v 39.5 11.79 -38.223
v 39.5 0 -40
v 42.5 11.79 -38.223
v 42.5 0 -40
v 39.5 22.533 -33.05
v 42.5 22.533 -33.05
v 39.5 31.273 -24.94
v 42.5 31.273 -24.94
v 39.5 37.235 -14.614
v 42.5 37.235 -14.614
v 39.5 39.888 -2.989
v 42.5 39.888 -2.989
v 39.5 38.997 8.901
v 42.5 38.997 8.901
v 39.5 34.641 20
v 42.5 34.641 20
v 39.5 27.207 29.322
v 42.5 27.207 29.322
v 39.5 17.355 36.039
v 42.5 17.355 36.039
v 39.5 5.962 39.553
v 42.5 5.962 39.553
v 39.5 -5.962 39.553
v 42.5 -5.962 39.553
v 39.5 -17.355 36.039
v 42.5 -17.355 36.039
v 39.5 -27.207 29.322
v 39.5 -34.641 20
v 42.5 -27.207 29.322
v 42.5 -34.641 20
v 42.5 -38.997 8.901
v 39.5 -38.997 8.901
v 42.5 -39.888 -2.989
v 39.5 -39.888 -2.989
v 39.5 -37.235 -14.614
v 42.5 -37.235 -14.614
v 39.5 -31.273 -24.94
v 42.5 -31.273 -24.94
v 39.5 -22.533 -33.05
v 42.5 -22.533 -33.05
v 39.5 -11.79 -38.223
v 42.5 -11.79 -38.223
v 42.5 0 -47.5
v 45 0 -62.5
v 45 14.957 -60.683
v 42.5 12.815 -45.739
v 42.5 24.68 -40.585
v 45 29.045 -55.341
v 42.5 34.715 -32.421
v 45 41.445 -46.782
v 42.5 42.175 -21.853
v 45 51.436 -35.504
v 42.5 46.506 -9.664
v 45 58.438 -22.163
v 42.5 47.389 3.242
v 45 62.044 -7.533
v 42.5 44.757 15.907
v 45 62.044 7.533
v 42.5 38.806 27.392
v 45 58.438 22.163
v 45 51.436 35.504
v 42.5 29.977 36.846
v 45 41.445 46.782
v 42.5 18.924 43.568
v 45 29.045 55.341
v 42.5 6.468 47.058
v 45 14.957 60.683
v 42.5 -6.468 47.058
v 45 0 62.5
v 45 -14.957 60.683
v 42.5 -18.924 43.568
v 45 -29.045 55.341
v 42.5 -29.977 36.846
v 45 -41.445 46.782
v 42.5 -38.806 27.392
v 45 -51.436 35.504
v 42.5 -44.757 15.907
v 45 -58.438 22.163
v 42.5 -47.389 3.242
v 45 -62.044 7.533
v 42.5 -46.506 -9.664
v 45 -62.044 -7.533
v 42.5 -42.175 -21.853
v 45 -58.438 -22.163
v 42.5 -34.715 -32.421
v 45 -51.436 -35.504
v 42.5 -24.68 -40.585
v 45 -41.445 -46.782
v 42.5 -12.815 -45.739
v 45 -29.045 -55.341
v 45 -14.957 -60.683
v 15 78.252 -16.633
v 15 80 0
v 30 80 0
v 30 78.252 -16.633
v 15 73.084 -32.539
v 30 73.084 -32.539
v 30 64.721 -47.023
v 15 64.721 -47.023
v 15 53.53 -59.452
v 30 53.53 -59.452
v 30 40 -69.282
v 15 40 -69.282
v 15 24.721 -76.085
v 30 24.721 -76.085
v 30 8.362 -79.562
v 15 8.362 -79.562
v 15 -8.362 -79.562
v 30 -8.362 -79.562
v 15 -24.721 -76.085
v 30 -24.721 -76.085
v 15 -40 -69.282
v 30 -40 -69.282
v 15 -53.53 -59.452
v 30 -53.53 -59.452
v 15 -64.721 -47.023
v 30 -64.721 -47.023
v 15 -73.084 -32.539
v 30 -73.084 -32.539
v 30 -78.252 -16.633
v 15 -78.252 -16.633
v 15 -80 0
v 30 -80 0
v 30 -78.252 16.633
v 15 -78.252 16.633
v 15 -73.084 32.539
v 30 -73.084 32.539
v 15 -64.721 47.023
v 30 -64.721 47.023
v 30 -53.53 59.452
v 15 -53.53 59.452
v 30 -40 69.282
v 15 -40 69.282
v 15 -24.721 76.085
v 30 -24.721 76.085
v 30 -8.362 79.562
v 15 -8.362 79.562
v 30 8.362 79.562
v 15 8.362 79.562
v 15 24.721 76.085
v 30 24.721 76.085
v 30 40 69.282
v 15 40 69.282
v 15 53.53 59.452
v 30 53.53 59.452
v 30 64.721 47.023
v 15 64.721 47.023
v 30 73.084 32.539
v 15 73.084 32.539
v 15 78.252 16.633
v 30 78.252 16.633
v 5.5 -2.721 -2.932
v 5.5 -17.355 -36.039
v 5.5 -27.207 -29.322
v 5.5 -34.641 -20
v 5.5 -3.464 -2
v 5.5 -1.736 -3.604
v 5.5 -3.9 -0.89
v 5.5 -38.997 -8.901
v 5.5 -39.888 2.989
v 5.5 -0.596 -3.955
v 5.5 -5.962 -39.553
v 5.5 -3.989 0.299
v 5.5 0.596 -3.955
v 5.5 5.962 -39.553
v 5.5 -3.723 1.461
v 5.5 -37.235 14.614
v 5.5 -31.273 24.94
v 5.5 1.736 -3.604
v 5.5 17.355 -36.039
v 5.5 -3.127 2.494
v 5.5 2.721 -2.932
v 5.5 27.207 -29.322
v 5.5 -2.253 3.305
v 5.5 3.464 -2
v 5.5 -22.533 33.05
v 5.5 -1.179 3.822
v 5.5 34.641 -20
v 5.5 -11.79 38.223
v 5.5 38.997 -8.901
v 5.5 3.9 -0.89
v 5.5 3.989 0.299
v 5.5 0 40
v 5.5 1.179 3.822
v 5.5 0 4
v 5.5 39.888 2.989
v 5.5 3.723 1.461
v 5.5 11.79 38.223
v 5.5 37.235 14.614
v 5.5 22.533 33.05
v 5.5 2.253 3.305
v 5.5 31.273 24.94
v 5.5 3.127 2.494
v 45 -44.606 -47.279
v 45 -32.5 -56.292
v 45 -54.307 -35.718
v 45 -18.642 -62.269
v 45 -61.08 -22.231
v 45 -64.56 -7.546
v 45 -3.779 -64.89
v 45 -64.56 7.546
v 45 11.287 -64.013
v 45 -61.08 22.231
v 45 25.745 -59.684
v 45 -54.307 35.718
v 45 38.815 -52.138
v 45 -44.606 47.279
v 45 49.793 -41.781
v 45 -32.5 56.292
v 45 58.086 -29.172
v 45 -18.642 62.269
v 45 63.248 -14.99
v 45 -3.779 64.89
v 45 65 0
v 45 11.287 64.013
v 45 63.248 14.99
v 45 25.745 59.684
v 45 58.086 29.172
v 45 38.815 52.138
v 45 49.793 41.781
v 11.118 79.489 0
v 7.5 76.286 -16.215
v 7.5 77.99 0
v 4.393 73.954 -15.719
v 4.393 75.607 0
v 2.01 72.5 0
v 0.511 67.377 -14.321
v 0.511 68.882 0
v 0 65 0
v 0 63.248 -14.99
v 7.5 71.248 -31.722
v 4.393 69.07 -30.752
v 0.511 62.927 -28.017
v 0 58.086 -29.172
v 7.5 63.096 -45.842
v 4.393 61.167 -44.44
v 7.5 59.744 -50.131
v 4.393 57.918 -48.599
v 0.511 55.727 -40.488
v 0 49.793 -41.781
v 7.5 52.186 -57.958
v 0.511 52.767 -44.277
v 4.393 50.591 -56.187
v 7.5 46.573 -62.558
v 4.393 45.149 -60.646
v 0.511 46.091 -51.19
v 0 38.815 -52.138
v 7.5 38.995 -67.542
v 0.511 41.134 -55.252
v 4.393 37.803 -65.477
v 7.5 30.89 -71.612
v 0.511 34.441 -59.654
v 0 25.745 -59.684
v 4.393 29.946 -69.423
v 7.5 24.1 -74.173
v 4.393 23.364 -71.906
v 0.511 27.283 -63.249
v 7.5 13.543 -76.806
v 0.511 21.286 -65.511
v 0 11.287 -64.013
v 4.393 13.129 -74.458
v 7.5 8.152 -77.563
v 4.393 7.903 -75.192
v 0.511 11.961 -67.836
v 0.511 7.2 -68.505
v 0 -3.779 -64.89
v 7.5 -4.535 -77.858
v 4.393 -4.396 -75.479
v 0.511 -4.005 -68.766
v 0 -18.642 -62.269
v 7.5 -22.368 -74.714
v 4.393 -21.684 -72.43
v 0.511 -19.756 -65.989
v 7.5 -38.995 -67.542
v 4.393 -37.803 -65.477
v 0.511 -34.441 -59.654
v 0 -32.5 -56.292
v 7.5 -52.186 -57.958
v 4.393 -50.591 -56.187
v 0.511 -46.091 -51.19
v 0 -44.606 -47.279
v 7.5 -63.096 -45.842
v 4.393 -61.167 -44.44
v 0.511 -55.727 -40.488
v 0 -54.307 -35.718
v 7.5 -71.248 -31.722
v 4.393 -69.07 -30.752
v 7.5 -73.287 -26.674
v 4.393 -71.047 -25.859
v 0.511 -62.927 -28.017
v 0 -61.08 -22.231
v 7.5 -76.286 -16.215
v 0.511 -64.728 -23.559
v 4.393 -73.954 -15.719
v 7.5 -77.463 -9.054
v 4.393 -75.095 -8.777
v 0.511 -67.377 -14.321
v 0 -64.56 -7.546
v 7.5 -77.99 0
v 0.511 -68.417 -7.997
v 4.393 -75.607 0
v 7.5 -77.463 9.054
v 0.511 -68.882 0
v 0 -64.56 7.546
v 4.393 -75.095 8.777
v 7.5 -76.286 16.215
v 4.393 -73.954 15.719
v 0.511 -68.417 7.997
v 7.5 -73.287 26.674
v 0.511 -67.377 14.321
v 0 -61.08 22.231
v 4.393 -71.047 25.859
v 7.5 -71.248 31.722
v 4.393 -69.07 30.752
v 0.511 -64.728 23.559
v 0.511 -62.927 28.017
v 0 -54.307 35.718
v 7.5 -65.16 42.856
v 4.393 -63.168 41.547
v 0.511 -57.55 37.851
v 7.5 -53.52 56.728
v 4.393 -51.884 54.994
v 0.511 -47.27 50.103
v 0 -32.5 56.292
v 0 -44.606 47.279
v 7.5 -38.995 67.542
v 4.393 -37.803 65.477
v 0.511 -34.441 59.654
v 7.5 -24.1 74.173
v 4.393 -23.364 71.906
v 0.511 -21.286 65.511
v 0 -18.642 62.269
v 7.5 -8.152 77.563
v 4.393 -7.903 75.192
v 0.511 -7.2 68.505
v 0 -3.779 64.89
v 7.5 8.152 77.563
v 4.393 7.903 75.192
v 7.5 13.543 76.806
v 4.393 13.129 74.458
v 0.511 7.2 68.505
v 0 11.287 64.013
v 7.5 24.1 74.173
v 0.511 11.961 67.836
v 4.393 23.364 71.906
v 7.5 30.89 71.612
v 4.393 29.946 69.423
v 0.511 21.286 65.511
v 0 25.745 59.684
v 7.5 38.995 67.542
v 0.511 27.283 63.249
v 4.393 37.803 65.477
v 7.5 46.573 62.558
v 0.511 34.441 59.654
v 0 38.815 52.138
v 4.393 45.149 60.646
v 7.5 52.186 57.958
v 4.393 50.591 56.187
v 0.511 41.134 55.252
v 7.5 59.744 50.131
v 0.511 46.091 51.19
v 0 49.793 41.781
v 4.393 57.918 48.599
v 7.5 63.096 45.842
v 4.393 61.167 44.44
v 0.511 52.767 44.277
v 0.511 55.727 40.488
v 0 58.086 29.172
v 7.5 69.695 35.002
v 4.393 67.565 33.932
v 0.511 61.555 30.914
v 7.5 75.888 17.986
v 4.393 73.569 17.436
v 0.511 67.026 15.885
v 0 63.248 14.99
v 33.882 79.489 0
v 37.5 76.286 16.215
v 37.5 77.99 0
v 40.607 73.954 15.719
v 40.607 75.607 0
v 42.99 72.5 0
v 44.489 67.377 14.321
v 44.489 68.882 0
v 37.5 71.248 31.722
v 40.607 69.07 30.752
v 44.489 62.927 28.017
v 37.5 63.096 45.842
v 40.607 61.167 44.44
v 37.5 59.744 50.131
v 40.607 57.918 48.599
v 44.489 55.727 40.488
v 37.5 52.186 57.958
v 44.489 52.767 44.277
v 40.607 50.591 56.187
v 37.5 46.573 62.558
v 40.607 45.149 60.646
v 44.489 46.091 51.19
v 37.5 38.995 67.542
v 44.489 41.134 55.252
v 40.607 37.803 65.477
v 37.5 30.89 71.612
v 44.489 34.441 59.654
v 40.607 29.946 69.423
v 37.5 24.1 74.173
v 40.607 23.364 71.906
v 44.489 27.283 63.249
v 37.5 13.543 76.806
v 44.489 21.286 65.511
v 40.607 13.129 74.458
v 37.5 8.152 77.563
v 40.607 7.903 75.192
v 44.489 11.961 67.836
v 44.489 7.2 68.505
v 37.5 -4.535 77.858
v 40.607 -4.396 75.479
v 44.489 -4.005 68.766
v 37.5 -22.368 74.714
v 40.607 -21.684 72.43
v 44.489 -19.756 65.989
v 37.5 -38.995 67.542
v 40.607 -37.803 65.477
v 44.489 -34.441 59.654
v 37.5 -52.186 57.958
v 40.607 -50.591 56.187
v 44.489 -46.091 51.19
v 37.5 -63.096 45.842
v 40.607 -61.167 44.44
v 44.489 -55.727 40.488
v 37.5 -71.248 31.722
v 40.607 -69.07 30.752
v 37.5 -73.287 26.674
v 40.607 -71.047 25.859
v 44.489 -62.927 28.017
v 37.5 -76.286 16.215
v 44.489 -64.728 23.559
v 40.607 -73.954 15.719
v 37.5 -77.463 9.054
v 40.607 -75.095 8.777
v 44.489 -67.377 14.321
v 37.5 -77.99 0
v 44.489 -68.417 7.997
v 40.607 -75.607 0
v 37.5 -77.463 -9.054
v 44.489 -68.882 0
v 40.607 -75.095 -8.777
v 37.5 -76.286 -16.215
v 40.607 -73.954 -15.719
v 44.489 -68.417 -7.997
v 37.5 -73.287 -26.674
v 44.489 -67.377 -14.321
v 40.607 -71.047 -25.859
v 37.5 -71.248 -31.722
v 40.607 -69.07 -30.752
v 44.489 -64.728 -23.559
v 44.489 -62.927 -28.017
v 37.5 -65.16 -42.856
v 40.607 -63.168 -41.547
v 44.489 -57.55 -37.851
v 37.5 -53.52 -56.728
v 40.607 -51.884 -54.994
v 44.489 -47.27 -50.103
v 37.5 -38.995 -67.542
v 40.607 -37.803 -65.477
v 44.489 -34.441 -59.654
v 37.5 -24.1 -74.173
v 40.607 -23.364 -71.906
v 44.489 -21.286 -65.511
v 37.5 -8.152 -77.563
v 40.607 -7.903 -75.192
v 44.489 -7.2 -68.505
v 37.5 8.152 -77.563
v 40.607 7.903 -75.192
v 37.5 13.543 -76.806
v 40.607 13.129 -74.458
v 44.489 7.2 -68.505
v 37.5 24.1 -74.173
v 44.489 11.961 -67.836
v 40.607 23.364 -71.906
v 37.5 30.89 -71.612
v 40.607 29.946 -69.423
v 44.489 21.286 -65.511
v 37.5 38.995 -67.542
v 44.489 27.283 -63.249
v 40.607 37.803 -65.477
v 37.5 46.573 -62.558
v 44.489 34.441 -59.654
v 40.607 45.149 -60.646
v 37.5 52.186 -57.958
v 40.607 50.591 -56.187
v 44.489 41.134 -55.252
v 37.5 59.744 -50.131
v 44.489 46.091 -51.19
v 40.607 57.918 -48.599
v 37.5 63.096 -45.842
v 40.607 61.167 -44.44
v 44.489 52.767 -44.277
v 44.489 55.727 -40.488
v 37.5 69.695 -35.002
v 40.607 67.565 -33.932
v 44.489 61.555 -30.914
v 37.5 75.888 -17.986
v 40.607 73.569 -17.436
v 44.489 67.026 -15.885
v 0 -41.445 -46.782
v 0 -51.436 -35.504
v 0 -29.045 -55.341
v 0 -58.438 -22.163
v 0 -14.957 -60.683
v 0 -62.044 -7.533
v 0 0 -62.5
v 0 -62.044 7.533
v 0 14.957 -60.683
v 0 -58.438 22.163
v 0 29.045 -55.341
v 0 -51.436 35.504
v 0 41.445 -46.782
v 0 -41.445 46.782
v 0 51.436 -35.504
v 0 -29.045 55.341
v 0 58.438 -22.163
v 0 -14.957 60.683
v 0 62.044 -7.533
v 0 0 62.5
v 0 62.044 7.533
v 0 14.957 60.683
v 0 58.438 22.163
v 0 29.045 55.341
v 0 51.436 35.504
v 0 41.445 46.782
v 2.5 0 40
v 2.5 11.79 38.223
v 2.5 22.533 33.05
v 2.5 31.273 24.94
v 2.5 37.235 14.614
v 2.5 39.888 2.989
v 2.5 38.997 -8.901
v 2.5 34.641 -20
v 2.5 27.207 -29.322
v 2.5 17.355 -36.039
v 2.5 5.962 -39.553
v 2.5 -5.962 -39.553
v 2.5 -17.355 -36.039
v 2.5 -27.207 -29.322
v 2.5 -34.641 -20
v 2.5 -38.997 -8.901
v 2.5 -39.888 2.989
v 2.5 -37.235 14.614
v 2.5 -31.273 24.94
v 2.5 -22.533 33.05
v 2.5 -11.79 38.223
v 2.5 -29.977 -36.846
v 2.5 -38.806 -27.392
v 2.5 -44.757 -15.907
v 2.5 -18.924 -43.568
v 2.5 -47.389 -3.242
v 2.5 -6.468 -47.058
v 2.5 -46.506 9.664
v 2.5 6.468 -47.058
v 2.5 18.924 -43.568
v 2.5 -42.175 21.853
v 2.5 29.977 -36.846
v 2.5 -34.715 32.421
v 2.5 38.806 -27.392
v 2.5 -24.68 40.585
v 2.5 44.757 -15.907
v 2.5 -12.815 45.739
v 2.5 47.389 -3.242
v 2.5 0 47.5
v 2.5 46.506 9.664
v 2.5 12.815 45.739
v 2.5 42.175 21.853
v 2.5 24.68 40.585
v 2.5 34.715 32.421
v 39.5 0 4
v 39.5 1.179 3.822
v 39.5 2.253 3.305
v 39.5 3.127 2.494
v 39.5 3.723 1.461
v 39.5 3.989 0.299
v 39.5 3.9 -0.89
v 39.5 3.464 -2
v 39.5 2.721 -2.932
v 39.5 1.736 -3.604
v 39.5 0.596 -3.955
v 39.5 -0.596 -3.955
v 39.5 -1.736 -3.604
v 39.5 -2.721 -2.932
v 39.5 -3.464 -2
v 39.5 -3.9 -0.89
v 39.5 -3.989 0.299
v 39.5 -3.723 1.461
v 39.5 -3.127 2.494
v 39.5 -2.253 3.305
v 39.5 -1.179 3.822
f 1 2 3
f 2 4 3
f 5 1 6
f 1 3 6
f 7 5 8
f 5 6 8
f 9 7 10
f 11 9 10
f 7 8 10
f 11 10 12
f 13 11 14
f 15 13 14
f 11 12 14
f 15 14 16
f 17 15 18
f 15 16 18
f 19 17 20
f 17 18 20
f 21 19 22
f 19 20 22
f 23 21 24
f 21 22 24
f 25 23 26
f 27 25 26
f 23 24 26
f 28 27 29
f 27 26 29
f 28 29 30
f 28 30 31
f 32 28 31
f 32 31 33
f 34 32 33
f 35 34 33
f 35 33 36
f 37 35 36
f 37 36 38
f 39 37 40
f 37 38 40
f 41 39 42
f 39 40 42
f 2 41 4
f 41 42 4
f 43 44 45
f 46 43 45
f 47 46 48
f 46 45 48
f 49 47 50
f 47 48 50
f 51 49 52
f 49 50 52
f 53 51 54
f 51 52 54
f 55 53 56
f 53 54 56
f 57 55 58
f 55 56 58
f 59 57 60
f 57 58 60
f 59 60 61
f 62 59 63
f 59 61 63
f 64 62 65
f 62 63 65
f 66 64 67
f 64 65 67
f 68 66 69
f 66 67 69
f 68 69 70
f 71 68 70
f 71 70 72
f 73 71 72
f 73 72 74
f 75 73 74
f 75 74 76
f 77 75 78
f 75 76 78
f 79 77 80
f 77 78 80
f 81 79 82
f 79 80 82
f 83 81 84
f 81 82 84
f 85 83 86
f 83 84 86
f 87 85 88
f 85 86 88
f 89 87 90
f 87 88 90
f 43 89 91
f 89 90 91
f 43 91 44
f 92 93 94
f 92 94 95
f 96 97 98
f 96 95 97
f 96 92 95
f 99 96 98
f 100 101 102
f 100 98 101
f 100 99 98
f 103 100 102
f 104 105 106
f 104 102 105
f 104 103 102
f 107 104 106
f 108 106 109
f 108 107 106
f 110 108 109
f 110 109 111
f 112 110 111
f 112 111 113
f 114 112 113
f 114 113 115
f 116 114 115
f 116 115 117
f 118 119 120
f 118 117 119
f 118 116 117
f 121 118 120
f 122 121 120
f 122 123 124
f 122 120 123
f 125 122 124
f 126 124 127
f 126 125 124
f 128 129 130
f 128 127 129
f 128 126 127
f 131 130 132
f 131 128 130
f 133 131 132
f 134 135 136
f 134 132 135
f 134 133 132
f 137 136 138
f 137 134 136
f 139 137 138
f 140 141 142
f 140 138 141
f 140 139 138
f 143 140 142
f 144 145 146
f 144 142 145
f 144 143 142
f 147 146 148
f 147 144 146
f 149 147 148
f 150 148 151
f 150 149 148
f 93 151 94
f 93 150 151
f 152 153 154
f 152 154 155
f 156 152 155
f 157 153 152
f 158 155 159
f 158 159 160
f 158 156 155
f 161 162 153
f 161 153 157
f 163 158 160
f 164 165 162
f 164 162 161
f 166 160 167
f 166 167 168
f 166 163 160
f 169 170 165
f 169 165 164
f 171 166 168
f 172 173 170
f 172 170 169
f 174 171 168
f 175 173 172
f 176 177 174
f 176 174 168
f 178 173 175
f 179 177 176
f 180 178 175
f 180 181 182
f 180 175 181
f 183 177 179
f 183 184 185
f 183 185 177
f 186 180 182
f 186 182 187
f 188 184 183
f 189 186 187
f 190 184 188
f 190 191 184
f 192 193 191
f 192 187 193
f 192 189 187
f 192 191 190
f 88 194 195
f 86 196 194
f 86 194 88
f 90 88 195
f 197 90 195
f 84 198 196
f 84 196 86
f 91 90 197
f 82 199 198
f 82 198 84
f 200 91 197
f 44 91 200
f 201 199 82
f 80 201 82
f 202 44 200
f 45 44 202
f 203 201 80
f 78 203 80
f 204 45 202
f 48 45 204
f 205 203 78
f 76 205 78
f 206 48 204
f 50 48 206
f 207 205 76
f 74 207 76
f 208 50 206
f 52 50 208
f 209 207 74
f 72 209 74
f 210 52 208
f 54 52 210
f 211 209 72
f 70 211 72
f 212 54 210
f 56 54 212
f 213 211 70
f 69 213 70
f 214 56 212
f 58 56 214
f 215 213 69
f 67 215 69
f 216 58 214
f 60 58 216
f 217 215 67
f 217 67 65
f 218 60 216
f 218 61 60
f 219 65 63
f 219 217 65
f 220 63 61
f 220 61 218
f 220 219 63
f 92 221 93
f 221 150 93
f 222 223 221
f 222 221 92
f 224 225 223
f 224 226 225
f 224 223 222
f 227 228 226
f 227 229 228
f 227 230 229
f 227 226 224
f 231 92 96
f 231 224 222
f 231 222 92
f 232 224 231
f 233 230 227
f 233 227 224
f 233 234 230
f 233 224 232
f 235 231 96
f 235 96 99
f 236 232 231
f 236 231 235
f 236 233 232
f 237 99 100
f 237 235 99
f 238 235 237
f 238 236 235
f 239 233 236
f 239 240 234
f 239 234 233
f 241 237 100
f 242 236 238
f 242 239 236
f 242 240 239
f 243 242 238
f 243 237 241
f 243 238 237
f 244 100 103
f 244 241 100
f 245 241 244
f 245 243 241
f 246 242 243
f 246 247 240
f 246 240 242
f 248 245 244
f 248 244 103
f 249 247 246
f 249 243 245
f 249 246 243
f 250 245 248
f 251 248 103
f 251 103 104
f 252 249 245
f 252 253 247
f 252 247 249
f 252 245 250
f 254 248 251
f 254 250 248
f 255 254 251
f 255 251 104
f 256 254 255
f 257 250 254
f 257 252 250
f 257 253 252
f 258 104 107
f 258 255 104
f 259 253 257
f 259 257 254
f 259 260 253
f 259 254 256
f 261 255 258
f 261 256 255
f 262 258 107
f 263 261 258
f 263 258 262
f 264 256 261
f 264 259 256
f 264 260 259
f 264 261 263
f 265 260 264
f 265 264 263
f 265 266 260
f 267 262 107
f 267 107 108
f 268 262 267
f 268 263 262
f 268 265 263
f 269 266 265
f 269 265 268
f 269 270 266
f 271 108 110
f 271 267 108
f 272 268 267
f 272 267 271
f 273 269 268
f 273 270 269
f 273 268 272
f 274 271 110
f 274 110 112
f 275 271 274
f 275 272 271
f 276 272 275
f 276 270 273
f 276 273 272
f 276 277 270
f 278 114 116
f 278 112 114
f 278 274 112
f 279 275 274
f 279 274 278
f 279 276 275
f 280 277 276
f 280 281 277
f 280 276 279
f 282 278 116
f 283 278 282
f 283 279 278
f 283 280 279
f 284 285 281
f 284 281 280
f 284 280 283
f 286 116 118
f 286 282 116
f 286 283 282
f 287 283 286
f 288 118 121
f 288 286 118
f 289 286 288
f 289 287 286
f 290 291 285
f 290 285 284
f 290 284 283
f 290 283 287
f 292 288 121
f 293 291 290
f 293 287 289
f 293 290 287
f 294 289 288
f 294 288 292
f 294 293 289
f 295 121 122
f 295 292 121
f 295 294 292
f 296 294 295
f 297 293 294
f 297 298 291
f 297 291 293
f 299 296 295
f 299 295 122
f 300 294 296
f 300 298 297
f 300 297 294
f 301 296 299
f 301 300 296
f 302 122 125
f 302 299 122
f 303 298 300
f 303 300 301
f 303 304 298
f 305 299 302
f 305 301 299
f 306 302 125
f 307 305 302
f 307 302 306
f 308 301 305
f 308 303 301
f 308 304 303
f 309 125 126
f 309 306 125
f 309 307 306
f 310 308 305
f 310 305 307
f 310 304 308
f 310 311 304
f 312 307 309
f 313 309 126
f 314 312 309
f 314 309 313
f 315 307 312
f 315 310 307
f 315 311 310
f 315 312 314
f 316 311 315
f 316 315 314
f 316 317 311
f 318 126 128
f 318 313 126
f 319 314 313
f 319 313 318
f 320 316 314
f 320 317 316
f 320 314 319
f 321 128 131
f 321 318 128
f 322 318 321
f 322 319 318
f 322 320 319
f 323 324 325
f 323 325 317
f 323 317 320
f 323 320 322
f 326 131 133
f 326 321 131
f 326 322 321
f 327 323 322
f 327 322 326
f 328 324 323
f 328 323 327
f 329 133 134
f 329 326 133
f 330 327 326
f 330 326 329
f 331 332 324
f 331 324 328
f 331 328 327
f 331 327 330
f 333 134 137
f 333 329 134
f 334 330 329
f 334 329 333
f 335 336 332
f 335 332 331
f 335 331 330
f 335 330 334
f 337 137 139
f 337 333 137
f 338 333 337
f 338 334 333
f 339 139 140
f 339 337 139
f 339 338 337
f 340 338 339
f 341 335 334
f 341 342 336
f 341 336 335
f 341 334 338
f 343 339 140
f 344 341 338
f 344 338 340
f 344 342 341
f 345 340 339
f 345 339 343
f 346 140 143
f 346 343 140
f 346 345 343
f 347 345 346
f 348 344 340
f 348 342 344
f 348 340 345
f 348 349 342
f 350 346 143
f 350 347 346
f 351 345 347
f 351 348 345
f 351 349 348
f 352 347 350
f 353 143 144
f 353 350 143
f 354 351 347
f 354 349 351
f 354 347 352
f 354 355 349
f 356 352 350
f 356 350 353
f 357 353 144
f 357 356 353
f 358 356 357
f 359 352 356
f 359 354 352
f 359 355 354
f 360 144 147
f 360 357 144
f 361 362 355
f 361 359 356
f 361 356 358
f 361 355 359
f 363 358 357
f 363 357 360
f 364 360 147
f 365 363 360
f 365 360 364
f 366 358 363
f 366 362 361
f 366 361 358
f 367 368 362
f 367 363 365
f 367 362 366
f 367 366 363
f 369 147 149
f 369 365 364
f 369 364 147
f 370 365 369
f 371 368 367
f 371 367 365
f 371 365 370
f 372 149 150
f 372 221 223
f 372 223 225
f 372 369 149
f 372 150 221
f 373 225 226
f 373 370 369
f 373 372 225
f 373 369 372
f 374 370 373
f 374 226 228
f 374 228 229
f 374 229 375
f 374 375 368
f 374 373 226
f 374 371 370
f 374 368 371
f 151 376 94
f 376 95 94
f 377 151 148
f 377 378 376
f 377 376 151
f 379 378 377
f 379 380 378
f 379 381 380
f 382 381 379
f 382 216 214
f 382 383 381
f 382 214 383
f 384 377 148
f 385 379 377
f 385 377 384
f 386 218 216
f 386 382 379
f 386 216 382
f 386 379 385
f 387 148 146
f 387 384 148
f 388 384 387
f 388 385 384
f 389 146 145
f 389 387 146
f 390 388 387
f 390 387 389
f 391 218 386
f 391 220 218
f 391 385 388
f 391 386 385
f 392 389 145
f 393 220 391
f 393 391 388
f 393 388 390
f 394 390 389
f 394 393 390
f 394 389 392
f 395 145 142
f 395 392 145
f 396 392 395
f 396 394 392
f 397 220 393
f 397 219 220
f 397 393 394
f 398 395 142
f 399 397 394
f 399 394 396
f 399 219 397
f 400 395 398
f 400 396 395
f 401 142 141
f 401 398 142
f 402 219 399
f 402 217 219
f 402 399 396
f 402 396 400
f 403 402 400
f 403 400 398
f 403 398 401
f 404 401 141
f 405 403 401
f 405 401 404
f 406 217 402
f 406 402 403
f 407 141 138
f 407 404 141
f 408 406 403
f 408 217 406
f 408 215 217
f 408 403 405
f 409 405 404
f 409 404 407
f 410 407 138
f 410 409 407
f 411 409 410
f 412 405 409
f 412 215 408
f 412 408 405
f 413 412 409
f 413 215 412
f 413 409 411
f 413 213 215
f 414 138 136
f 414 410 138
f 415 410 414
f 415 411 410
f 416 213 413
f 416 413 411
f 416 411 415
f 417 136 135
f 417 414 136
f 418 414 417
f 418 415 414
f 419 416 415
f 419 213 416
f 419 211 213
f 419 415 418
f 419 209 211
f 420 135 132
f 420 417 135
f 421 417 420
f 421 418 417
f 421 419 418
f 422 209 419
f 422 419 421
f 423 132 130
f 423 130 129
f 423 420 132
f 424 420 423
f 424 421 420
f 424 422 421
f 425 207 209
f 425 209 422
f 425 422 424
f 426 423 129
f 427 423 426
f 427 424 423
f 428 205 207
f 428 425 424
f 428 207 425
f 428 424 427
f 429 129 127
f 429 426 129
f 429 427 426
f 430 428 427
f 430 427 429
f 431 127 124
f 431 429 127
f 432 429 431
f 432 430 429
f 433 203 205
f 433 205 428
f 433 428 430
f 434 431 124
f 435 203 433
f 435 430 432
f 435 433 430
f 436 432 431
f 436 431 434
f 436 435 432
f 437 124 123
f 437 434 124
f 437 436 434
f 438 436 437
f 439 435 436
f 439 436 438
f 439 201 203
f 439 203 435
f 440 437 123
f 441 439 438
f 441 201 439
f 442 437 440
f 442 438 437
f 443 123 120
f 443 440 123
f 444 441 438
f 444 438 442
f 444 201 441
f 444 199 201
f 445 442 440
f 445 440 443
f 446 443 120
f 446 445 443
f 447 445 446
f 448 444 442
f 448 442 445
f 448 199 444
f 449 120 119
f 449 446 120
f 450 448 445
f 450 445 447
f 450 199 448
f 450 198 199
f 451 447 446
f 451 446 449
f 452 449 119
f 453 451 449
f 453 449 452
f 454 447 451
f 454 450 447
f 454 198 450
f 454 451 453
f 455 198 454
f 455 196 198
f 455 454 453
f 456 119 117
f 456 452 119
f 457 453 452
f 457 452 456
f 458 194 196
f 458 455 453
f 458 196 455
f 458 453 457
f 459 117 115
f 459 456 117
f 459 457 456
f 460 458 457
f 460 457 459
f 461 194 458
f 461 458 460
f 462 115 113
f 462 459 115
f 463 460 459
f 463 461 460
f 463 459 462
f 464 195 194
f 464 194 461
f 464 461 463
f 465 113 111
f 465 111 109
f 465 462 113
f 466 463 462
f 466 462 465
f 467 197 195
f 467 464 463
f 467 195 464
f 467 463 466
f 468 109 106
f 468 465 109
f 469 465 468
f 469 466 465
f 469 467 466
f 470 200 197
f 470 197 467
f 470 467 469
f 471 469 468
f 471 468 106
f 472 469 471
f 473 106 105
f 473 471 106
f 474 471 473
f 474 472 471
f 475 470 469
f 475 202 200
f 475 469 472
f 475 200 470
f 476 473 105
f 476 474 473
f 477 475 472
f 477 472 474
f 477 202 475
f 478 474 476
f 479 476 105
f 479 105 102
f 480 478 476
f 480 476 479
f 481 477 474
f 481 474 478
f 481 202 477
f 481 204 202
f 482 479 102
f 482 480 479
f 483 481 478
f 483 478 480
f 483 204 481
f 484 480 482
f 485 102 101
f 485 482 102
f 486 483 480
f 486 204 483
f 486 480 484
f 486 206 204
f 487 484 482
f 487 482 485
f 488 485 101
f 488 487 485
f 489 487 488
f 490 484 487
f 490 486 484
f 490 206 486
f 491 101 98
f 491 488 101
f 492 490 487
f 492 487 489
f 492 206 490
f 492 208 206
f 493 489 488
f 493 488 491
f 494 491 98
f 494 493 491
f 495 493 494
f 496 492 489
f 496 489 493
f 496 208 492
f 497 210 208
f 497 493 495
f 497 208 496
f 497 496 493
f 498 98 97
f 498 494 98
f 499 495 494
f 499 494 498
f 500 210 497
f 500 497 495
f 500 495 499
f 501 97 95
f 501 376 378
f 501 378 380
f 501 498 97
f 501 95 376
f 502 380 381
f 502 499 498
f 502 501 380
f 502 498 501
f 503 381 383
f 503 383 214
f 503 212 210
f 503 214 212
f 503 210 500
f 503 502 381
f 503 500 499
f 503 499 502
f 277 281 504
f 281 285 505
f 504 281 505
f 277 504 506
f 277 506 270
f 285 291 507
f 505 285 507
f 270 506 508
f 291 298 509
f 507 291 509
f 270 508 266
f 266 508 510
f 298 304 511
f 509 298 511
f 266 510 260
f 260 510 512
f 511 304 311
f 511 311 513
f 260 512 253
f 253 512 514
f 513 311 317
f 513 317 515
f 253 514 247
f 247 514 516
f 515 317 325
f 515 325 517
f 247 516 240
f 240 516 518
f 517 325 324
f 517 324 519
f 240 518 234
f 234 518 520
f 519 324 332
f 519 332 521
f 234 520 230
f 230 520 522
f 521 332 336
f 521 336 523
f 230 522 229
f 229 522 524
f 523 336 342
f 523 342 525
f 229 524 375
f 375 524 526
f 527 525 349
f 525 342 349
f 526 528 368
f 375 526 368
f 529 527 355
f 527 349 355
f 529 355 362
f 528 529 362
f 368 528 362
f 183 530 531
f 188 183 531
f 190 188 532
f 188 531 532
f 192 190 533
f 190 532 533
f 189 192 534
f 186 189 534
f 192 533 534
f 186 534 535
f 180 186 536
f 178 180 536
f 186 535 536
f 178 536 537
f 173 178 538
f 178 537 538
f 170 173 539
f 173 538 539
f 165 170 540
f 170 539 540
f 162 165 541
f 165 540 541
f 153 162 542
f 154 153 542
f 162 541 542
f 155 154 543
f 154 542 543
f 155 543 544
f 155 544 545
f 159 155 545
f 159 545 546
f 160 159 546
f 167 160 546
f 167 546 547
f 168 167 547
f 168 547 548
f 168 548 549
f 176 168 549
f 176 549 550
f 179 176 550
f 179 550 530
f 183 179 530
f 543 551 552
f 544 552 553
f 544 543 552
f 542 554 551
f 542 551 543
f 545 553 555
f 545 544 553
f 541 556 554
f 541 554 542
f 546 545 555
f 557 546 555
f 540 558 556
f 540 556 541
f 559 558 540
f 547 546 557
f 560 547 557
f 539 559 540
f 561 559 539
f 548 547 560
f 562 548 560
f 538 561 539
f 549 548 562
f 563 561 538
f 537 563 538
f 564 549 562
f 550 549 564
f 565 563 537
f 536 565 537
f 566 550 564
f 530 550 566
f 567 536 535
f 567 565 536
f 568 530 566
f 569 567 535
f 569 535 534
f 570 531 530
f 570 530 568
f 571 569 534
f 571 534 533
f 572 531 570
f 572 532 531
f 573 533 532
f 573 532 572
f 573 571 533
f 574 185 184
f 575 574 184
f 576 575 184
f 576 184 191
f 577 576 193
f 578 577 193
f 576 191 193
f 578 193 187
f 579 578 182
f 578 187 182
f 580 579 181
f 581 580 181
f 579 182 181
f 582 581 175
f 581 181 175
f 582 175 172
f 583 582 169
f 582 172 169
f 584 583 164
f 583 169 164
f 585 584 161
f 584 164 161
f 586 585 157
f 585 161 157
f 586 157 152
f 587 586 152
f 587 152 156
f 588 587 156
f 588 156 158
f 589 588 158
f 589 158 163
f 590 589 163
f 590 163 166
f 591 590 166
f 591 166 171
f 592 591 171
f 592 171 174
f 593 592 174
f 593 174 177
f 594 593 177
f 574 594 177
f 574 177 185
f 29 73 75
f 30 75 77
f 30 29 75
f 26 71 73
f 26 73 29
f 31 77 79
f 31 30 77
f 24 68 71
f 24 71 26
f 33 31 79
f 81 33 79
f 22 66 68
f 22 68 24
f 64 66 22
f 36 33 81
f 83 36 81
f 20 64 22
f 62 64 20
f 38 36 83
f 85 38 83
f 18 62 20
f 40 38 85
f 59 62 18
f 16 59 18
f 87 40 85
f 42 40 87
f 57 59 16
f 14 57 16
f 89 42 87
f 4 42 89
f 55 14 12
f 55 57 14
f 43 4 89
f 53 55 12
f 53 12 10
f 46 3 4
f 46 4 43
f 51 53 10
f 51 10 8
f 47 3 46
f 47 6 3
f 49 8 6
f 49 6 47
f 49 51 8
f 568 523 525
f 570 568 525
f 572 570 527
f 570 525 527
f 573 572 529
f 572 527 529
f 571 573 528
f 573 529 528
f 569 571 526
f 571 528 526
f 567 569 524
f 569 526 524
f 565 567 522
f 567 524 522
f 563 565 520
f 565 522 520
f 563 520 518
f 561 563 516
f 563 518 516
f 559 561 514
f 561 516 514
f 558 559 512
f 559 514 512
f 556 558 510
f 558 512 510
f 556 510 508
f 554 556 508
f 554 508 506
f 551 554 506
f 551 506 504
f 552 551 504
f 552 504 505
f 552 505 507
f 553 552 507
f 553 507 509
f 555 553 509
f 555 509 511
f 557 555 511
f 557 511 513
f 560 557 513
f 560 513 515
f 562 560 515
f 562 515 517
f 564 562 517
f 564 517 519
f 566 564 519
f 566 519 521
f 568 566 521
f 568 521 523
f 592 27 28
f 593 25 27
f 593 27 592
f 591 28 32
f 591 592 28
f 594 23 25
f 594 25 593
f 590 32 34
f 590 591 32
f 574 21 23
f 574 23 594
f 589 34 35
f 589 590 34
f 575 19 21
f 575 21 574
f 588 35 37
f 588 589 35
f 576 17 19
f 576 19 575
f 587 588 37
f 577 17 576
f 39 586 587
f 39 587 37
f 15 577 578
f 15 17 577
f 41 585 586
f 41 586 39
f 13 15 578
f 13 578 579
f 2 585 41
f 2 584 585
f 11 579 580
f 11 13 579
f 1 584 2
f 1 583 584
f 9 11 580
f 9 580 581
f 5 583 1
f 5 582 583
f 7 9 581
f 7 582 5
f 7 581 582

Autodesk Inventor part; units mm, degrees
ref_plane "YZ Plane" through (0, 0, 0) normal (1, 0, 0) x (0, 1, 0)
ref_plane "XZ Plane" through (0, 0, 0) normal (0, 1, 0) x (-1, 0, 0)
ref_plane "XY Plane" through (0, 0, 0) normal (0, 0, 1) x (1, 0, 0)
sketch "Sketch1" plane through (0, 0, 0) normal (1, 0, 0) x (0, 1, 0)
  circle A0 centre (0, 0) radius 80
  dimension "d0" = 160
extrude "Extrusion1" add sketch "Sketch1" along normal blind 45
fillet "Fillet1" radius 15 2 edges at (45, -80, 0) (0, -80, 0)
sketch "Sketch2" plane through (45, 0, 0) normal (1, 0, 0) x (0, 0, -1)
  circle A0 centre (0, 0) radius 47.5
  dimension "d4" = 95
extrude "Extrusion2" cut sketch "Sketch2" against normal blind 2.5
sketch "Sketch3" plane through (0, 0, 0) normal (-1, 0, 0) x (0, 0, 1)
  circle A0 centre (0, 0) radius 47.5
  dimension "d7" = 95
extrude "Extrusion3" cut sketch "Sketch3" against normal blind 2.5
sketch "Sketch4" plane through (42.5, 0, 0) normal (1, 0, 0) x (0, 0, -1)
  circle A0 centre (0, 0) radius 40
  dimension "d10" = 80
extrude "Extrusion4" cut sketch "Sketch4" against normal blind 3
sketch "Sketch5" plane through (2.5, 0, 0) normal (-1, 0, 0) x (0, 0, 1)
  circle A0 centre (0, 0) radius 40
  dimension "d13" = 80
extrude "Extrusion5" cut sketch "Sketch5" against normal blind 3
chamfer "Chamfer1" distance 15 distance2 2.5 1 edges at (0, 0, -47.5) measured on face at (0, 35.0738, -47.3752)
chamfer "Chamfer2" distance 15 distance2 2.5 1 edges at (45, 0, 47.5) measured on face at (45, 35.0738, 47.3752)
sketch "Sketch6" plane through (5.5, 0, 0) normal (-1, 0, 0) x (0, 0, 1)
  circle A0 centre (0, 0) radius 4
  dimension "d22" = 8
extrude "Extrusion6" cut sketch "Sketch6" against normal blind 34000
properties part number "Wheel"
